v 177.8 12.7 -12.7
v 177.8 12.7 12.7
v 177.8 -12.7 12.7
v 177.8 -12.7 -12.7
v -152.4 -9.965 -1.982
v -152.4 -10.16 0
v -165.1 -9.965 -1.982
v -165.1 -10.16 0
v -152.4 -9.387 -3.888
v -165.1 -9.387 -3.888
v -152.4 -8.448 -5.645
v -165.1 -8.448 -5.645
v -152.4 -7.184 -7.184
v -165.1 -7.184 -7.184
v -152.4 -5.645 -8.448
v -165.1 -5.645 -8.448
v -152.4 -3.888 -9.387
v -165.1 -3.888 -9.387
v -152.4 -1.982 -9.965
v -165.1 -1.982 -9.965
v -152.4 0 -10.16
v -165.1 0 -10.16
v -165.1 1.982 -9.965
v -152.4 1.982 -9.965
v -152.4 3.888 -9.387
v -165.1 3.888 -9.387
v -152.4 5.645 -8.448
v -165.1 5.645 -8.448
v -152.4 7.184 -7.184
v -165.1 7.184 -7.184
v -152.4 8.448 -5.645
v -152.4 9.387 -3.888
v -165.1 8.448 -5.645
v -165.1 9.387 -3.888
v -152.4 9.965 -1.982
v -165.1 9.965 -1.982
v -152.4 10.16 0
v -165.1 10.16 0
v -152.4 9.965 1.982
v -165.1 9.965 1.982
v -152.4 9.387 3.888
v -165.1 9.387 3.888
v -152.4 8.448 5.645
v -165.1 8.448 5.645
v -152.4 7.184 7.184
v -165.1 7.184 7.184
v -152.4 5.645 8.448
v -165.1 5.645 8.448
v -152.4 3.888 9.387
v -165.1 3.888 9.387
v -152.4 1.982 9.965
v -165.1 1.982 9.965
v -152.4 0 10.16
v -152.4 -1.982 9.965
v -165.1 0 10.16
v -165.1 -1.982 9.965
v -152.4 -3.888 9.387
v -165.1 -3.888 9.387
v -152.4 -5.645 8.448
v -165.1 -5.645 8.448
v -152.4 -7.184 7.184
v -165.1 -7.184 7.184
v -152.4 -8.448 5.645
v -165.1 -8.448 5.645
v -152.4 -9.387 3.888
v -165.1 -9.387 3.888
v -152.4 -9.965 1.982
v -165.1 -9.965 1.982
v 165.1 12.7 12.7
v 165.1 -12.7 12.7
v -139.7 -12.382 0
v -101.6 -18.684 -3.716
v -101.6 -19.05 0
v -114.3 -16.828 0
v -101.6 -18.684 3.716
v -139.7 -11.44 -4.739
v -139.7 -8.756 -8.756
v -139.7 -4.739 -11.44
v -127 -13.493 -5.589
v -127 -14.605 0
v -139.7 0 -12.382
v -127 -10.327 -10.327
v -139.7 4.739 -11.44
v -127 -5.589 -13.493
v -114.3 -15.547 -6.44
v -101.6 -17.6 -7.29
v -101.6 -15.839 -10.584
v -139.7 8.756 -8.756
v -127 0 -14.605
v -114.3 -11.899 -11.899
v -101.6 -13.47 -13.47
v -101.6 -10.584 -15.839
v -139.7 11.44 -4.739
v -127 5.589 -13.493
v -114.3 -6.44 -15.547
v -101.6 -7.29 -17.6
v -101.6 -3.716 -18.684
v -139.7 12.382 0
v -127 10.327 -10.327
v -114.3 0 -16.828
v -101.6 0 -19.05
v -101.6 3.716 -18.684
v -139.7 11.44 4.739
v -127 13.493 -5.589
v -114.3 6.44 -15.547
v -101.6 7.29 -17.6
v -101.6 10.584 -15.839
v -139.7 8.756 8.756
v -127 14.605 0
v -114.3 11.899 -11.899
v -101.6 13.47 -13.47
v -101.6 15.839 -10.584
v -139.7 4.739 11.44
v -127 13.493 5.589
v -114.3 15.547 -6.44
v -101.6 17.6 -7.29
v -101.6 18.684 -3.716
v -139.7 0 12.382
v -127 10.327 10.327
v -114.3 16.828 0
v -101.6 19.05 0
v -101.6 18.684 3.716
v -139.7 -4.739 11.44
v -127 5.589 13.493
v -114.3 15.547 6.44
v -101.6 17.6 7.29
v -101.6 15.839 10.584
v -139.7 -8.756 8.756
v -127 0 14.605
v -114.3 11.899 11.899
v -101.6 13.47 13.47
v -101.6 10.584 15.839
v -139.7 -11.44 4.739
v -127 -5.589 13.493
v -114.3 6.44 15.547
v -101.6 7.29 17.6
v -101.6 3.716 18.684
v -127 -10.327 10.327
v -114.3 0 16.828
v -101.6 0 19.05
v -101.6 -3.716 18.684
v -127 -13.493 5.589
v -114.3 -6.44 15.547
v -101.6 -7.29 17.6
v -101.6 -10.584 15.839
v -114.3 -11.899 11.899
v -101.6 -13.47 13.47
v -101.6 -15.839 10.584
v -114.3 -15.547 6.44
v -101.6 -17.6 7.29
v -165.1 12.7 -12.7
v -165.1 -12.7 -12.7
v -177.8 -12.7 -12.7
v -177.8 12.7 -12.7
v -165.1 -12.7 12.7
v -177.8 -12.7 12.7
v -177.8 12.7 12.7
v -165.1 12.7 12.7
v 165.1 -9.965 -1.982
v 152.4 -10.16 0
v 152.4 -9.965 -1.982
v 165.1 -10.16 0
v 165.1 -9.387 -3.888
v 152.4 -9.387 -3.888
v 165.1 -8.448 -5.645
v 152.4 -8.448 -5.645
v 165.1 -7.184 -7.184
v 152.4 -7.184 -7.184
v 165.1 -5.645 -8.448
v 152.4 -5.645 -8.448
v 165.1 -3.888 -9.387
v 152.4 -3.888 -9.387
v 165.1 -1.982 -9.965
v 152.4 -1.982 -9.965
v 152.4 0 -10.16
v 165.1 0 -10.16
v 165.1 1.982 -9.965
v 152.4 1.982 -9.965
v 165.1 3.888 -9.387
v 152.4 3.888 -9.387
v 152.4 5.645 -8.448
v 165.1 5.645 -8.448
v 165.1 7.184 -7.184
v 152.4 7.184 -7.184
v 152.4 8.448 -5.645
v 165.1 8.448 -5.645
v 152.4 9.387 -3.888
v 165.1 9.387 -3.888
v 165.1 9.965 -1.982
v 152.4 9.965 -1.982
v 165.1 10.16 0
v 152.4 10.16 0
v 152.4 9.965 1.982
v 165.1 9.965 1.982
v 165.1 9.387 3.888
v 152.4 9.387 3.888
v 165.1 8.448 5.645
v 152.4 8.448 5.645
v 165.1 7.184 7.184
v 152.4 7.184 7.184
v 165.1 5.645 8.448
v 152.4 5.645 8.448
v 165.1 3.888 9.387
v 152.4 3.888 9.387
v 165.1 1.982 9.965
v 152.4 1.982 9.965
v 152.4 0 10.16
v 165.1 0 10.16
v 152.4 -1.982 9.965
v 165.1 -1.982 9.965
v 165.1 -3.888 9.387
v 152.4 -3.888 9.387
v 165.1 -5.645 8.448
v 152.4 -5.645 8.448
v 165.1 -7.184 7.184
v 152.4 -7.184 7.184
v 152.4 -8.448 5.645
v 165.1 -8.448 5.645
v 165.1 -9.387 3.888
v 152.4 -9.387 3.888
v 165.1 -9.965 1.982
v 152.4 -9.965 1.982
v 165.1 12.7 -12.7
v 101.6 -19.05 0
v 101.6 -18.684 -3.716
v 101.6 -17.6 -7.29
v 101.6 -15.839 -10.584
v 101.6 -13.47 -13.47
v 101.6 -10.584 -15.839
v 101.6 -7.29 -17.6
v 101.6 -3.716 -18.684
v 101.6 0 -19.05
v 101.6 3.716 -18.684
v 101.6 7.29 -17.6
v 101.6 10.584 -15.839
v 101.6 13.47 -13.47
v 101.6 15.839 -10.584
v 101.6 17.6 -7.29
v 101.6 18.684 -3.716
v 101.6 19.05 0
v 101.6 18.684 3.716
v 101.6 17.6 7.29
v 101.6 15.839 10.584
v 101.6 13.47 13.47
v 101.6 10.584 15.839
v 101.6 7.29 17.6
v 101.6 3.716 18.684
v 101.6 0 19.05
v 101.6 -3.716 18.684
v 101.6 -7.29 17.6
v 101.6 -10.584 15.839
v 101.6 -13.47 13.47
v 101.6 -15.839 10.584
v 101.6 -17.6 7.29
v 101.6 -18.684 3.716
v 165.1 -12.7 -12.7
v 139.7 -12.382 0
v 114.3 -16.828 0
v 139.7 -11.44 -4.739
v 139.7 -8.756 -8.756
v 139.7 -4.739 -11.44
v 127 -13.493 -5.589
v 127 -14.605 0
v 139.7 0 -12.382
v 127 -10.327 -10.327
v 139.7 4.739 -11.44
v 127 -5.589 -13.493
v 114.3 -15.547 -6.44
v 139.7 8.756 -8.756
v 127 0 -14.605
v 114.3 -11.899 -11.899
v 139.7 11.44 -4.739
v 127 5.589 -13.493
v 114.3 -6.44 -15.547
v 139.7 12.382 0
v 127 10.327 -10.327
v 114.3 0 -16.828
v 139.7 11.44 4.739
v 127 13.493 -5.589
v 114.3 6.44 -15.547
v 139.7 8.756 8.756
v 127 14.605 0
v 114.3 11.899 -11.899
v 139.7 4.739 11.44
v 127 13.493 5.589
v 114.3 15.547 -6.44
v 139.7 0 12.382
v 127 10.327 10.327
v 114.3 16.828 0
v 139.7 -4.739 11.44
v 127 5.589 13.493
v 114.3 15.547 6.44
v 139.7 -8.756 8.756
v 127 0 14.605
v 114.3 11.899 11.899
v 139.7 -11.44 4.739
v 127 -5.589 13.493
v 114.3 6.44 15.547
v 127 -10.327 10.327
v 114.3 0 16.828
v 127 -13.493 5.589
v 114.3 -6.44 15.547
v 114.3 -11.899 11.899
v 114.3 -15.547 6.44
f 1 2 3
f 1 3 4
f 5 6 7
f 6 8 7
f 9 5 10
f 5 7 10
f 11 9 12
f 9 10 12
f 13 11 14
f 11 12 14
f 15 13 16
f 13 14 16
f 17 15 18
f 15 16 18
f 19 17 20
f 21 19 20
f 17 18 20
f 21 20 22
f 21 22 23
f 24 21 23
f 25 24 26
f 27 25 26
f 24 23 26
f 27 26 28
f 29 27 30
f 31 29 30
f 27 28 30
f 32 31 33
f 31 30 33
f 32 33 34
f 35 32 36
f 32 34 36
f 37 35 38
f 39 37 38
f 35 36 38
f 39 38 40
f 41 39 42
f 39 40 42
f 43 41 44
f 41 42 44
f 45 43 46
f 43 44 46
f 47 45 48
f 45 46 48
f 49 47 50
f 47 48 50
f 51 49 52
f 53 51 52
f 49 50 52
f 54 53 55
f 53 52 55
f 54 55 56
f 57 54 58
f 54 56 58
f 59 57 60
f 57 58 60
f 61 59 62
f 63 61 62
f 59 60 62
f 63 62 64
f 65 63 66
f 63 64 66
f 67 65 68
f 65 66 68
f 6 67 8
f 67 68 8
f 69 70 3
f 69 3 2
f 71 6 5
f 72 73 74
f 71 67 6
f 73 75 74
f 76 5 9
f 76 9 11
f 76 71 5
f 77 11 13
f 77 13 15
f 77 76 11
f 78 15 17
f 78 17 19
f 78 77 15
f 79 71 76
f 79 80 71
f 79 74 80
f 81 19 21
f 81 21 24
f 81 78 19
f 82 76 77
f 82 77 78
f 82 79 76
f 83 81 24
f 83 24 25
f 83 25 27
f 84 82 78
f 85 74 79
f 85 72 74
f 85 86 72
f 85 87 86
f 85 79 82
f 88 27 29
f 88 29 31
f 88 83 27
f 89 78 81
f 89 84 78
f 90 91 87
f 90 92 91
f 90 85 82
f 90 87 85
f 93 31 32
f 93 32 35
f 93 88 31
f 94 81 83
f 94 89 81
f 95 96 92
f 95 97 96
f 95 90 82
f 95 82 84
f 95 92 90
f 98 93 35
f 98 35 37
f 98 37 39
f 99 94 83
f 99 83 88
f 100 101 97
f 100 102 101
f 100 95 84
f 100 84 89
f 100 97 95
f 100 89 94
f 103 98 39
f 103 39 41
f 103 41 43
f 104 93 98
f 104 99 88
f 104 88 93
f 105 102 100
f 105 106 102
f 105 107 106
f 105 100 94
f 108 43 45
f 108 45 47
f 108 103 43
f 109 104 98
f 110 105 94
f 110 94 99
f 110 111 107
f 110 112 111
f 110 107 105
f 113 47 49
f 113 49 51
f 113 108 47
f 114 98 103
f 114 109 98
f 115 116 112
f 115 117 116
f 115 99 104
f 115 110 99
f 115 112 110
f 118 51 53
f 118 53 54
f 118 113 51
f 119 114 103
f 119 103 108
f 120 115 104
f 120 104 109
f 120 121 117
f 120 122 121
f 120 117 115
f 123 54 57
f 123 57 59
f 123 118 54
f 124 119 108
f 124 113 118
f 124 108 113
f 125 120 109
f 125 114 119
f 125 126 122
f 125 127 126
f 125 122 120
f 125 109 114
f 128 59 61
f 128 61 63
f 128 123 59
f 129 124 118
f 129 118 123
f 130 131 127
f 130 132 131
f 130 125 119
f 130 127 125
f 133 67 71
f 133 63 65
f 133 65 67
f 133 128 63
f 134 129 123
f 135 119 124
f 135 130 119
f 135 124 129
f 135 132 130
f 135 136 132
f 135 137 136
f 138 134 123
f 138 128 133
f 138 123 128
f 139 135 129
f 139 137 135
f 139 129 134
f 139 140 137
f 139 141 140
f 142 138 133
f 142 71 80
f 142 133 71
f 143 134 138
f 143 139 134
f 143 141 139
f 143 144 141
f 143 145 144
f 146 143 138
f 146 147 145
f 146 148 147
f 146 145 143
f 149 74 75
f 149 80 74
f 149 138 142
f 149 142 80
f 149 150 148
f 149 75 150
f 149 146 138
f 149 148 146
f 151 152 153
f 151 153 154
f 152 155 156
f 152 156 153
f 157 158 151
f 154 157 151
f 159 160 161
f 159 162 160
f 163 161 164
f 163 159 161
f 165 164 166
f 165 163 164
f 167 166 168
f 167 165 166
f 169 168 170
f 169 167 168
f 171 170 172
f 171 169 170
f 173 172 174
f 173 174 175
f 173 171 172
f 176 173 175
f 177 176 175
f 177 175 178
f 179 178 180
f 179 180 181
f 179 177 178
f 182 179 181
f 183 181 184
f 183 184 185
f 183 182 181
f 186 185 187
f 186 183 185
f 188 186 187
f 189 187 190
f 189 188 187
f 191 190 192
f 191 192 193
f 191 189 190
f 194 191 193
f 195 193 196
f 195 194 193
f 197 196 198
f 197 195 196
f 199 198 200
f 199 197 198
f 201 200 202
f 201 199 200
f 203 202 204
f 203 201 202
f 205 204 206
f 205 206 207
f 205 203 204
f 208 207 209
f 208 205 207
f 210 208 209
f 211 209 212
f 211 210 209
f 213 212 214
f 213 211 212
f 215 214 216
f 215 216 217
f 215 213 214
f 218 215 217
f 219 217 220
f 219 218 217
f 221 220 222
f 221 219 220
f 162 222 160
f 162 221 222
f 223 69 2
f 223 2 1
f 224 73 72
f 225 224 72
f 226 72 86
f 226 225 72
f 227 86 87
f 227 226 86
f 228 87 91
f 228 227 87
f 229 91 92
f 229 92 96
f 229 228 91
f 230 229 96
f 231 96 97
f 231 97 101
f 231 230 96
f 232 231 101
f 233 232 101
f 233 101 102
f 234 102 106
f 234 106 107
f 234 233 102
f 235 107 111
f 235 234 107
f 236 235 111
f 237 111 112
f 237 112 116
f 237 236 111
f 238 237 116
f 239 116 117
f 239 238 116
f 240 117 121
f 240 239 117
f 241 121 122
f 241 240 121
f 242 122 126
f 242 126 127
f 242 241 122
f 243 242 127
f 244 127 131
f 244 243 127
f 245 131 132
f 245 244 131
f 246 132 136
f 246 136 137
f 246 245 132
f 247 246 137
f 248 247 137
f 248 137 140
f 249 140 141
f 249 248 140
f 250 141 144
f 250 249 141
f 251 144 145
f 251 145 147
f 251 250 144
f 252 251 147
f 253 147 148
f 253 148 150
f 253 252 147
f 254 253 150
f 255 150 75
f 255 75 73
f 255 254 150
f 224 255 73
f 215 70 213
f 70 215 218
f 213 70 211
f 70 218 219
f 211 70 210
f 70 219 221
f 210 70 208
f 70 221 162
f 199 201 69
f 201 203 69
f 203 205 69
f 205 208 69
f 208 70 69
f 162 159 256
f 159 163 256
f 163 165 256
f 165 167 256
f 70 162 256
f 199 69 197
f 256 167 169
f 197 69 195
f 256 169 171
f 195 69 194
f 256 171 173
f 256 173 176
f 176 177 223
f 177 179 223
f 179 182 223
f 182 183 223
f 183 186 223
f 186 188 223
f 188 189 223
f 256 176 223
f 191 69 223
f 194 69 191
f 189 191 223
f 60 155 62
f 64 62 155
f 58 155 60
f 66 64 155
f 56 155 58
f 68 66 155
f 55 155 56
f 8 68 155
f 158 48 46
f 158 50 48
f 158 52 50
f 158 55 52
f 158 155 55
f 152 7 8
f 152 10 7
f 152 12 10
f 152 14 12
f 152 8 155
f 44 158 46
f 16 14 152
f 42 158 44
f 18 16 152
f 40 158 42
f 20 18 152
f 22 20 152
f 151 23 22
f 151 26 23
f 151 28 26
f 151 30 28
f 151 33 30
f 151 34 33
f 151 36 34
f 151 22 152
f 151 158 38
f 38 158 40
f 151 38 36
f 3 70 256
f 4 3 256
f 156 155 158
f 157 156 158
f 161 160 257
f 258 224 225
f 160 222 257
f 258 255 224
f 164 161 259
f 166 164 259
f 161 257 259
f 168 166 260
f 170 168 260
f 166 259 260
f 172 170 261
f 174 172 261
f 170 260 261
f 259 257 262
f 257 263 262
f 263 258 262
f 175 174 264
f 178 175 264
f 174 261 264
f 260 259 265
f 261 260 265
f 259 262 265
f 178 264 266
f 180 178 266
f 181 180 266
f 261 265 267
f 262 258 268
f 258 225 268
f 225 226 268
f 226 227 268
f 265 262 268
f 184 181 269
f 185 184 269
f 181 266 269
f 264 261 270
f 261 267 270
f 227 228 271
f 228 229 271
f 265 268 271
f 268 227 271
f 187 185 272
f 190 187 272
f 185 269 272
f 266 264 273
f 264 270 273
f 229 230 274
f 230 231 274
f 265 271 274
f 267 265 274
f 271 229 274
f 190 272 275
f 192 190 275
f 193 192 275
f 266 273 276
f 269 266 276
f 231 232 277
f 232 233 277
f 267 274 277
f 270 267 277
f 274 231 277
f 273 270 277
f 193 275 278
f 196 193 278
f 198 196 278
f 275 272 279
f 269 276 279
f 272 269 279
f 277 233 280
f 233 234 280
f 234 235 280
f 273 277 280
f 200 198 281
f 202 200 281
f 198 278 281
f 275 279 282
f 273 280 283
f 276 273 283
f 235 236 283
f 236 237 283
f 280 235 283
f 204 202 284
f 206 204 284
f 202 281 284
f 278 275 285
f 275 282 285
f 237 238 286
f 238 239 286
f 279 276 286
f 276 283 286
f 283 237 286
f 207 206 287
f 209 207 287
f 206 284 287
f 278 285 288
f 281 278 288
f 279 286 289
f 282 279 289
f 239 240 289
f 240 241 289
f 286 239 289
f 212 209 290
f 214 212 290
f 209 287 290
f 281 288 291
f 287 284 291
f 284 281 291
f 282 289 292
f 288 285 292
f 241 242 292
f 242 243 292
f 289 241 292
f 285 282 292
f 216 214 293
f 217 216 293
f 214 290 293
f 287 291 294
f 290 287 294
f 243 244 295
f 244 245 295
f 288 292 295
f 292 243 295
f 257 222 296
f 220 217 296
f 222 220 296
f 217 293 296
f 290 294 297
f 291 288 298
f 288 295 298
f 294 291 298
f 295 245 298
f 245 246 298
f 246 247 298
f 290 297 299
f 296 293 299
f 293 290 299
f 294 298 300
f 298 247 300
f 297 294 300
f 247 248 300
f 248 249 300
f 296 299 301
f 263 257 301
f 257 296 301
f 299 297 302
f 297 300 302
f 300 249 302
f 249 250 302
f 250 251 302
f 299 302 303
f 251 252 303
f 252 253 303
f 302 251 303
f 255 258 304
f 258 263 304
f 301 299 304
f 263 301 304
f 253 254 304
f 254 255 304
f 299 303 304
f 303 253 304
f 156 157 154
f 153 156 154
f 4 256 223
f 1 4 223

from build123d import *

# Parameters (mm, degrees)
SKETCH1_W           = 12.7
SKETCH1_H           = 10.16
SKETCH3_W           = 25.4
SKETCH3_H           = 25.4
BOSS_EXTRUDE2_DEPTH = 12.7


with BuildPart() as part:
    # Sketch1 → Revolve3 (revolve)
    with BuildSketch(Plane.XY, mode=Mode.PRIVATE) as revolve3_sk:
        Polygon((101.6, 19.05), (0, 19.05), (0, 0), (152.4, 0), (152.4, 10.16), align=None)
        with Locations((158.75, 5.08)):
            Rectangle(SKETCH1_W, SKETCH1_H)
    revolve(revolve3_sk.sketch.rotate(Axis((0, 0, 0), (1, 0, 0)), 180), axis=Axis((0, 0, 0), (1, 0, 0)))

    # Sketch3 → Boss-Extrude2 (add)
    with BuildSketch(Plane(origin=(165.1, 0, 0), x_dir=(0, 0, -1), z_dir=(1, 0, 0))):
        Rectangle(SKETCH3_W, SKETCH3_H)
    extrude(amount=BOSS_EXTRUDE2_DEPTH)

    # Mirror1: part across plane


with BuildPart() as part_1:
    add(part.part)
    add(part.part.mirror(Plane(origin=(0, 0, 0), x_dir=(0, 0, 1), z_dir=(1, 0, 0))))


solid = part_1.part
